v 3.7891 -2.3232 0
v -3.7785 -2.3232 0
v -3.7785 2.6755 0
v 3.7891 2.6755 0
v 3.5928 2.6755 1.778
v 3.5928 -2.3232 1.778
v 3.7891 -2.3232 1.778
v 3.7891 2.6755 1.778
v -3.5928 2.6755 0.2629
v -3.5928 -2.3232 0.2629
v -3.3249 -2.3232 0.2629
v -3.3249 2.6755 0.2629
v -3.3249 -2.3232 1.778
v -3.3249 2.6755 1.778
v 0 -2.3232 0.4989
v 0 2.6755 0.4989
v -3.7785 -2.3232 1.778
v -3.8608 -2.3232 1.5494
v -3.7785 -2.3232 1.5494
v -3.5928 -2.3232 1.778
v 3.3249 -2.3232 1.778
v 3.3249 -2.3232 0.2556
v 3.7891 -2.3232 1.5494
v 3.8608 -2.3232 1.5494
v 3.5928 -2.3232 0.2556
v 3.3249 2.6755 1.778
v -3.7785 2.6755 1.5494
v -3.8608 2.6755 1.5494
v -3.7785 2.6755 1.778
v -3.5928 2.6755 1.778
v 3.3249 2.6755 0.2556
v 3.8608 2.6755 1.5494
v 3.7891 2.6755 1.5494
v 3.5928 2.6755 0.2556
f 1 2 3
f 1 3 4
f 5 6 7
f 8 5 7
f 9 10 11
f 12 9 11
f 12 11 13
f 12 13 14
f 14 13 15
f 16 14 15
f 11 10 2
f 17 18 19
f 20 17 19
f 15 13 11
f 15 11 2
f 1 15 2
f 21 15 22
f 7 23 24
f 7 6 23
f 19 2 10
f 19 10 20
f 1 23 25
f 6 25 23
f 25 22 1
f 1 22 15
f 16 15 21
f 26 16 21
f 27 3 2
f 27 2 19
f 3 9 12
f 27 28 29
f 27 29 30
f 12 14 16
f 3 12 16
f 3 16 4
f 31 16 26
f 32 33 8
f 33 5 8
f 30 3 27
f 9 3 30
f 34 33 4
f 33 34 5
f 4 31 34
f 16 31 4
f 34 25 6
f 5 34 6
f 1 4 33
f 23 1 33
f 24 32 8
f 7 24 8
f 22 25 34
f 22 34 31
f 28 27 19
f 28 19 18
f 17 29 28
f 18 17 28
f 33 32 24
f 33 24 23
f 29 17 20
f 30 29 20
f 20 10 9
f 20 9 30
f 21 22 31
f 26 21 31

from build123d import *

# Parameters (mm, degrees)
F0_W     = 6.64972
F0_H     = 4.99872
F1_DEPTH = 1.778
F3_DEPTH = 25.4
F4_W     = 0.26797
F4_H     = 1.5150946512
F4_H_2   = 0.2629053488
F4_H_3   = 0.255633
F4_H_4   = 1.522367
F5_DEPTH = 4.99872
F6_W     = 0.0717422777
F6_H     = 1.5494
F6_W_2   = 0.0822888074
F7_DEPTH = 25.4


with BuildPart() as f1:
    # F0 (on Top) → F1 (new body)
    with BuildSketch(Plane.XY):
        with Locations((0, 0.1761515194)):
            Rectangle(F0_W, F0_H)
    extrude(amount=F1_DEPTH)

    # F2 (on face) → F3 (cut)
    with BuildSketch(Plane.XZ.offset(2.3232084806)):
        Polygon((-3.32486, 1.778), (0, 0.4989000154), (3.32486, 1.778), align=None)
    extrude(amount=-F3_DEPTH, mode=Mode.SUBTRACT)

    # F4 (on face) → F5 (join, through all)
    with BuildSketch(Plane.XZ.offset(2.3232084806)):
        with Locations((-3.726815, 1.0204526744)):
            Rectangle(F4_W, F4_H)
        with Locations((-3.726815, 0.1314526744)):
            Rectangle(F4_W, F4_H_2)
        with Locations((-3.458845, 0.1314526744)):
            Rectangle(F4_W, F4_H_2)
        with Locations((3.458845, 0.1278165)):
            Rectangle(F4_W, F4_H_3)
        with Locations((3.726815, 0.1278165)):
            Rectangle(F4_W, F4_H_3)
        with Locations((3.726815, 1.0168165)):
            Rectangle(F4_W, F4_H_4)
    extrude(amount=-F5_DEPTH)

    # F6 (on face) → F7 (cut)
    with BuildSketch(Plane(origin=(0, 2.6755115194, 0), x_dir=(-1, 0, 0), z_dir=(0, 1, 0))):
        with Locations((-3.8249288612, 0.7747)):
            Rectangle(F6_W, F6_H)
        Polygon((-3.8608, 1.778), (-3.8608, 1.5494), (-3.7890577223, 1.778), align=None)
        Polygon((3.7785111926, 1.778), (3.8608, 1.5494), (3.8608, 1.778), align=None)
        with Locations((3.8196555963, 0.7747)):
            Rectangle(F6_W_2, F6_H)
    extrude(amount=-F7_DEPTH, mode=Mode.SUBTRACT)


solid = f1.part
